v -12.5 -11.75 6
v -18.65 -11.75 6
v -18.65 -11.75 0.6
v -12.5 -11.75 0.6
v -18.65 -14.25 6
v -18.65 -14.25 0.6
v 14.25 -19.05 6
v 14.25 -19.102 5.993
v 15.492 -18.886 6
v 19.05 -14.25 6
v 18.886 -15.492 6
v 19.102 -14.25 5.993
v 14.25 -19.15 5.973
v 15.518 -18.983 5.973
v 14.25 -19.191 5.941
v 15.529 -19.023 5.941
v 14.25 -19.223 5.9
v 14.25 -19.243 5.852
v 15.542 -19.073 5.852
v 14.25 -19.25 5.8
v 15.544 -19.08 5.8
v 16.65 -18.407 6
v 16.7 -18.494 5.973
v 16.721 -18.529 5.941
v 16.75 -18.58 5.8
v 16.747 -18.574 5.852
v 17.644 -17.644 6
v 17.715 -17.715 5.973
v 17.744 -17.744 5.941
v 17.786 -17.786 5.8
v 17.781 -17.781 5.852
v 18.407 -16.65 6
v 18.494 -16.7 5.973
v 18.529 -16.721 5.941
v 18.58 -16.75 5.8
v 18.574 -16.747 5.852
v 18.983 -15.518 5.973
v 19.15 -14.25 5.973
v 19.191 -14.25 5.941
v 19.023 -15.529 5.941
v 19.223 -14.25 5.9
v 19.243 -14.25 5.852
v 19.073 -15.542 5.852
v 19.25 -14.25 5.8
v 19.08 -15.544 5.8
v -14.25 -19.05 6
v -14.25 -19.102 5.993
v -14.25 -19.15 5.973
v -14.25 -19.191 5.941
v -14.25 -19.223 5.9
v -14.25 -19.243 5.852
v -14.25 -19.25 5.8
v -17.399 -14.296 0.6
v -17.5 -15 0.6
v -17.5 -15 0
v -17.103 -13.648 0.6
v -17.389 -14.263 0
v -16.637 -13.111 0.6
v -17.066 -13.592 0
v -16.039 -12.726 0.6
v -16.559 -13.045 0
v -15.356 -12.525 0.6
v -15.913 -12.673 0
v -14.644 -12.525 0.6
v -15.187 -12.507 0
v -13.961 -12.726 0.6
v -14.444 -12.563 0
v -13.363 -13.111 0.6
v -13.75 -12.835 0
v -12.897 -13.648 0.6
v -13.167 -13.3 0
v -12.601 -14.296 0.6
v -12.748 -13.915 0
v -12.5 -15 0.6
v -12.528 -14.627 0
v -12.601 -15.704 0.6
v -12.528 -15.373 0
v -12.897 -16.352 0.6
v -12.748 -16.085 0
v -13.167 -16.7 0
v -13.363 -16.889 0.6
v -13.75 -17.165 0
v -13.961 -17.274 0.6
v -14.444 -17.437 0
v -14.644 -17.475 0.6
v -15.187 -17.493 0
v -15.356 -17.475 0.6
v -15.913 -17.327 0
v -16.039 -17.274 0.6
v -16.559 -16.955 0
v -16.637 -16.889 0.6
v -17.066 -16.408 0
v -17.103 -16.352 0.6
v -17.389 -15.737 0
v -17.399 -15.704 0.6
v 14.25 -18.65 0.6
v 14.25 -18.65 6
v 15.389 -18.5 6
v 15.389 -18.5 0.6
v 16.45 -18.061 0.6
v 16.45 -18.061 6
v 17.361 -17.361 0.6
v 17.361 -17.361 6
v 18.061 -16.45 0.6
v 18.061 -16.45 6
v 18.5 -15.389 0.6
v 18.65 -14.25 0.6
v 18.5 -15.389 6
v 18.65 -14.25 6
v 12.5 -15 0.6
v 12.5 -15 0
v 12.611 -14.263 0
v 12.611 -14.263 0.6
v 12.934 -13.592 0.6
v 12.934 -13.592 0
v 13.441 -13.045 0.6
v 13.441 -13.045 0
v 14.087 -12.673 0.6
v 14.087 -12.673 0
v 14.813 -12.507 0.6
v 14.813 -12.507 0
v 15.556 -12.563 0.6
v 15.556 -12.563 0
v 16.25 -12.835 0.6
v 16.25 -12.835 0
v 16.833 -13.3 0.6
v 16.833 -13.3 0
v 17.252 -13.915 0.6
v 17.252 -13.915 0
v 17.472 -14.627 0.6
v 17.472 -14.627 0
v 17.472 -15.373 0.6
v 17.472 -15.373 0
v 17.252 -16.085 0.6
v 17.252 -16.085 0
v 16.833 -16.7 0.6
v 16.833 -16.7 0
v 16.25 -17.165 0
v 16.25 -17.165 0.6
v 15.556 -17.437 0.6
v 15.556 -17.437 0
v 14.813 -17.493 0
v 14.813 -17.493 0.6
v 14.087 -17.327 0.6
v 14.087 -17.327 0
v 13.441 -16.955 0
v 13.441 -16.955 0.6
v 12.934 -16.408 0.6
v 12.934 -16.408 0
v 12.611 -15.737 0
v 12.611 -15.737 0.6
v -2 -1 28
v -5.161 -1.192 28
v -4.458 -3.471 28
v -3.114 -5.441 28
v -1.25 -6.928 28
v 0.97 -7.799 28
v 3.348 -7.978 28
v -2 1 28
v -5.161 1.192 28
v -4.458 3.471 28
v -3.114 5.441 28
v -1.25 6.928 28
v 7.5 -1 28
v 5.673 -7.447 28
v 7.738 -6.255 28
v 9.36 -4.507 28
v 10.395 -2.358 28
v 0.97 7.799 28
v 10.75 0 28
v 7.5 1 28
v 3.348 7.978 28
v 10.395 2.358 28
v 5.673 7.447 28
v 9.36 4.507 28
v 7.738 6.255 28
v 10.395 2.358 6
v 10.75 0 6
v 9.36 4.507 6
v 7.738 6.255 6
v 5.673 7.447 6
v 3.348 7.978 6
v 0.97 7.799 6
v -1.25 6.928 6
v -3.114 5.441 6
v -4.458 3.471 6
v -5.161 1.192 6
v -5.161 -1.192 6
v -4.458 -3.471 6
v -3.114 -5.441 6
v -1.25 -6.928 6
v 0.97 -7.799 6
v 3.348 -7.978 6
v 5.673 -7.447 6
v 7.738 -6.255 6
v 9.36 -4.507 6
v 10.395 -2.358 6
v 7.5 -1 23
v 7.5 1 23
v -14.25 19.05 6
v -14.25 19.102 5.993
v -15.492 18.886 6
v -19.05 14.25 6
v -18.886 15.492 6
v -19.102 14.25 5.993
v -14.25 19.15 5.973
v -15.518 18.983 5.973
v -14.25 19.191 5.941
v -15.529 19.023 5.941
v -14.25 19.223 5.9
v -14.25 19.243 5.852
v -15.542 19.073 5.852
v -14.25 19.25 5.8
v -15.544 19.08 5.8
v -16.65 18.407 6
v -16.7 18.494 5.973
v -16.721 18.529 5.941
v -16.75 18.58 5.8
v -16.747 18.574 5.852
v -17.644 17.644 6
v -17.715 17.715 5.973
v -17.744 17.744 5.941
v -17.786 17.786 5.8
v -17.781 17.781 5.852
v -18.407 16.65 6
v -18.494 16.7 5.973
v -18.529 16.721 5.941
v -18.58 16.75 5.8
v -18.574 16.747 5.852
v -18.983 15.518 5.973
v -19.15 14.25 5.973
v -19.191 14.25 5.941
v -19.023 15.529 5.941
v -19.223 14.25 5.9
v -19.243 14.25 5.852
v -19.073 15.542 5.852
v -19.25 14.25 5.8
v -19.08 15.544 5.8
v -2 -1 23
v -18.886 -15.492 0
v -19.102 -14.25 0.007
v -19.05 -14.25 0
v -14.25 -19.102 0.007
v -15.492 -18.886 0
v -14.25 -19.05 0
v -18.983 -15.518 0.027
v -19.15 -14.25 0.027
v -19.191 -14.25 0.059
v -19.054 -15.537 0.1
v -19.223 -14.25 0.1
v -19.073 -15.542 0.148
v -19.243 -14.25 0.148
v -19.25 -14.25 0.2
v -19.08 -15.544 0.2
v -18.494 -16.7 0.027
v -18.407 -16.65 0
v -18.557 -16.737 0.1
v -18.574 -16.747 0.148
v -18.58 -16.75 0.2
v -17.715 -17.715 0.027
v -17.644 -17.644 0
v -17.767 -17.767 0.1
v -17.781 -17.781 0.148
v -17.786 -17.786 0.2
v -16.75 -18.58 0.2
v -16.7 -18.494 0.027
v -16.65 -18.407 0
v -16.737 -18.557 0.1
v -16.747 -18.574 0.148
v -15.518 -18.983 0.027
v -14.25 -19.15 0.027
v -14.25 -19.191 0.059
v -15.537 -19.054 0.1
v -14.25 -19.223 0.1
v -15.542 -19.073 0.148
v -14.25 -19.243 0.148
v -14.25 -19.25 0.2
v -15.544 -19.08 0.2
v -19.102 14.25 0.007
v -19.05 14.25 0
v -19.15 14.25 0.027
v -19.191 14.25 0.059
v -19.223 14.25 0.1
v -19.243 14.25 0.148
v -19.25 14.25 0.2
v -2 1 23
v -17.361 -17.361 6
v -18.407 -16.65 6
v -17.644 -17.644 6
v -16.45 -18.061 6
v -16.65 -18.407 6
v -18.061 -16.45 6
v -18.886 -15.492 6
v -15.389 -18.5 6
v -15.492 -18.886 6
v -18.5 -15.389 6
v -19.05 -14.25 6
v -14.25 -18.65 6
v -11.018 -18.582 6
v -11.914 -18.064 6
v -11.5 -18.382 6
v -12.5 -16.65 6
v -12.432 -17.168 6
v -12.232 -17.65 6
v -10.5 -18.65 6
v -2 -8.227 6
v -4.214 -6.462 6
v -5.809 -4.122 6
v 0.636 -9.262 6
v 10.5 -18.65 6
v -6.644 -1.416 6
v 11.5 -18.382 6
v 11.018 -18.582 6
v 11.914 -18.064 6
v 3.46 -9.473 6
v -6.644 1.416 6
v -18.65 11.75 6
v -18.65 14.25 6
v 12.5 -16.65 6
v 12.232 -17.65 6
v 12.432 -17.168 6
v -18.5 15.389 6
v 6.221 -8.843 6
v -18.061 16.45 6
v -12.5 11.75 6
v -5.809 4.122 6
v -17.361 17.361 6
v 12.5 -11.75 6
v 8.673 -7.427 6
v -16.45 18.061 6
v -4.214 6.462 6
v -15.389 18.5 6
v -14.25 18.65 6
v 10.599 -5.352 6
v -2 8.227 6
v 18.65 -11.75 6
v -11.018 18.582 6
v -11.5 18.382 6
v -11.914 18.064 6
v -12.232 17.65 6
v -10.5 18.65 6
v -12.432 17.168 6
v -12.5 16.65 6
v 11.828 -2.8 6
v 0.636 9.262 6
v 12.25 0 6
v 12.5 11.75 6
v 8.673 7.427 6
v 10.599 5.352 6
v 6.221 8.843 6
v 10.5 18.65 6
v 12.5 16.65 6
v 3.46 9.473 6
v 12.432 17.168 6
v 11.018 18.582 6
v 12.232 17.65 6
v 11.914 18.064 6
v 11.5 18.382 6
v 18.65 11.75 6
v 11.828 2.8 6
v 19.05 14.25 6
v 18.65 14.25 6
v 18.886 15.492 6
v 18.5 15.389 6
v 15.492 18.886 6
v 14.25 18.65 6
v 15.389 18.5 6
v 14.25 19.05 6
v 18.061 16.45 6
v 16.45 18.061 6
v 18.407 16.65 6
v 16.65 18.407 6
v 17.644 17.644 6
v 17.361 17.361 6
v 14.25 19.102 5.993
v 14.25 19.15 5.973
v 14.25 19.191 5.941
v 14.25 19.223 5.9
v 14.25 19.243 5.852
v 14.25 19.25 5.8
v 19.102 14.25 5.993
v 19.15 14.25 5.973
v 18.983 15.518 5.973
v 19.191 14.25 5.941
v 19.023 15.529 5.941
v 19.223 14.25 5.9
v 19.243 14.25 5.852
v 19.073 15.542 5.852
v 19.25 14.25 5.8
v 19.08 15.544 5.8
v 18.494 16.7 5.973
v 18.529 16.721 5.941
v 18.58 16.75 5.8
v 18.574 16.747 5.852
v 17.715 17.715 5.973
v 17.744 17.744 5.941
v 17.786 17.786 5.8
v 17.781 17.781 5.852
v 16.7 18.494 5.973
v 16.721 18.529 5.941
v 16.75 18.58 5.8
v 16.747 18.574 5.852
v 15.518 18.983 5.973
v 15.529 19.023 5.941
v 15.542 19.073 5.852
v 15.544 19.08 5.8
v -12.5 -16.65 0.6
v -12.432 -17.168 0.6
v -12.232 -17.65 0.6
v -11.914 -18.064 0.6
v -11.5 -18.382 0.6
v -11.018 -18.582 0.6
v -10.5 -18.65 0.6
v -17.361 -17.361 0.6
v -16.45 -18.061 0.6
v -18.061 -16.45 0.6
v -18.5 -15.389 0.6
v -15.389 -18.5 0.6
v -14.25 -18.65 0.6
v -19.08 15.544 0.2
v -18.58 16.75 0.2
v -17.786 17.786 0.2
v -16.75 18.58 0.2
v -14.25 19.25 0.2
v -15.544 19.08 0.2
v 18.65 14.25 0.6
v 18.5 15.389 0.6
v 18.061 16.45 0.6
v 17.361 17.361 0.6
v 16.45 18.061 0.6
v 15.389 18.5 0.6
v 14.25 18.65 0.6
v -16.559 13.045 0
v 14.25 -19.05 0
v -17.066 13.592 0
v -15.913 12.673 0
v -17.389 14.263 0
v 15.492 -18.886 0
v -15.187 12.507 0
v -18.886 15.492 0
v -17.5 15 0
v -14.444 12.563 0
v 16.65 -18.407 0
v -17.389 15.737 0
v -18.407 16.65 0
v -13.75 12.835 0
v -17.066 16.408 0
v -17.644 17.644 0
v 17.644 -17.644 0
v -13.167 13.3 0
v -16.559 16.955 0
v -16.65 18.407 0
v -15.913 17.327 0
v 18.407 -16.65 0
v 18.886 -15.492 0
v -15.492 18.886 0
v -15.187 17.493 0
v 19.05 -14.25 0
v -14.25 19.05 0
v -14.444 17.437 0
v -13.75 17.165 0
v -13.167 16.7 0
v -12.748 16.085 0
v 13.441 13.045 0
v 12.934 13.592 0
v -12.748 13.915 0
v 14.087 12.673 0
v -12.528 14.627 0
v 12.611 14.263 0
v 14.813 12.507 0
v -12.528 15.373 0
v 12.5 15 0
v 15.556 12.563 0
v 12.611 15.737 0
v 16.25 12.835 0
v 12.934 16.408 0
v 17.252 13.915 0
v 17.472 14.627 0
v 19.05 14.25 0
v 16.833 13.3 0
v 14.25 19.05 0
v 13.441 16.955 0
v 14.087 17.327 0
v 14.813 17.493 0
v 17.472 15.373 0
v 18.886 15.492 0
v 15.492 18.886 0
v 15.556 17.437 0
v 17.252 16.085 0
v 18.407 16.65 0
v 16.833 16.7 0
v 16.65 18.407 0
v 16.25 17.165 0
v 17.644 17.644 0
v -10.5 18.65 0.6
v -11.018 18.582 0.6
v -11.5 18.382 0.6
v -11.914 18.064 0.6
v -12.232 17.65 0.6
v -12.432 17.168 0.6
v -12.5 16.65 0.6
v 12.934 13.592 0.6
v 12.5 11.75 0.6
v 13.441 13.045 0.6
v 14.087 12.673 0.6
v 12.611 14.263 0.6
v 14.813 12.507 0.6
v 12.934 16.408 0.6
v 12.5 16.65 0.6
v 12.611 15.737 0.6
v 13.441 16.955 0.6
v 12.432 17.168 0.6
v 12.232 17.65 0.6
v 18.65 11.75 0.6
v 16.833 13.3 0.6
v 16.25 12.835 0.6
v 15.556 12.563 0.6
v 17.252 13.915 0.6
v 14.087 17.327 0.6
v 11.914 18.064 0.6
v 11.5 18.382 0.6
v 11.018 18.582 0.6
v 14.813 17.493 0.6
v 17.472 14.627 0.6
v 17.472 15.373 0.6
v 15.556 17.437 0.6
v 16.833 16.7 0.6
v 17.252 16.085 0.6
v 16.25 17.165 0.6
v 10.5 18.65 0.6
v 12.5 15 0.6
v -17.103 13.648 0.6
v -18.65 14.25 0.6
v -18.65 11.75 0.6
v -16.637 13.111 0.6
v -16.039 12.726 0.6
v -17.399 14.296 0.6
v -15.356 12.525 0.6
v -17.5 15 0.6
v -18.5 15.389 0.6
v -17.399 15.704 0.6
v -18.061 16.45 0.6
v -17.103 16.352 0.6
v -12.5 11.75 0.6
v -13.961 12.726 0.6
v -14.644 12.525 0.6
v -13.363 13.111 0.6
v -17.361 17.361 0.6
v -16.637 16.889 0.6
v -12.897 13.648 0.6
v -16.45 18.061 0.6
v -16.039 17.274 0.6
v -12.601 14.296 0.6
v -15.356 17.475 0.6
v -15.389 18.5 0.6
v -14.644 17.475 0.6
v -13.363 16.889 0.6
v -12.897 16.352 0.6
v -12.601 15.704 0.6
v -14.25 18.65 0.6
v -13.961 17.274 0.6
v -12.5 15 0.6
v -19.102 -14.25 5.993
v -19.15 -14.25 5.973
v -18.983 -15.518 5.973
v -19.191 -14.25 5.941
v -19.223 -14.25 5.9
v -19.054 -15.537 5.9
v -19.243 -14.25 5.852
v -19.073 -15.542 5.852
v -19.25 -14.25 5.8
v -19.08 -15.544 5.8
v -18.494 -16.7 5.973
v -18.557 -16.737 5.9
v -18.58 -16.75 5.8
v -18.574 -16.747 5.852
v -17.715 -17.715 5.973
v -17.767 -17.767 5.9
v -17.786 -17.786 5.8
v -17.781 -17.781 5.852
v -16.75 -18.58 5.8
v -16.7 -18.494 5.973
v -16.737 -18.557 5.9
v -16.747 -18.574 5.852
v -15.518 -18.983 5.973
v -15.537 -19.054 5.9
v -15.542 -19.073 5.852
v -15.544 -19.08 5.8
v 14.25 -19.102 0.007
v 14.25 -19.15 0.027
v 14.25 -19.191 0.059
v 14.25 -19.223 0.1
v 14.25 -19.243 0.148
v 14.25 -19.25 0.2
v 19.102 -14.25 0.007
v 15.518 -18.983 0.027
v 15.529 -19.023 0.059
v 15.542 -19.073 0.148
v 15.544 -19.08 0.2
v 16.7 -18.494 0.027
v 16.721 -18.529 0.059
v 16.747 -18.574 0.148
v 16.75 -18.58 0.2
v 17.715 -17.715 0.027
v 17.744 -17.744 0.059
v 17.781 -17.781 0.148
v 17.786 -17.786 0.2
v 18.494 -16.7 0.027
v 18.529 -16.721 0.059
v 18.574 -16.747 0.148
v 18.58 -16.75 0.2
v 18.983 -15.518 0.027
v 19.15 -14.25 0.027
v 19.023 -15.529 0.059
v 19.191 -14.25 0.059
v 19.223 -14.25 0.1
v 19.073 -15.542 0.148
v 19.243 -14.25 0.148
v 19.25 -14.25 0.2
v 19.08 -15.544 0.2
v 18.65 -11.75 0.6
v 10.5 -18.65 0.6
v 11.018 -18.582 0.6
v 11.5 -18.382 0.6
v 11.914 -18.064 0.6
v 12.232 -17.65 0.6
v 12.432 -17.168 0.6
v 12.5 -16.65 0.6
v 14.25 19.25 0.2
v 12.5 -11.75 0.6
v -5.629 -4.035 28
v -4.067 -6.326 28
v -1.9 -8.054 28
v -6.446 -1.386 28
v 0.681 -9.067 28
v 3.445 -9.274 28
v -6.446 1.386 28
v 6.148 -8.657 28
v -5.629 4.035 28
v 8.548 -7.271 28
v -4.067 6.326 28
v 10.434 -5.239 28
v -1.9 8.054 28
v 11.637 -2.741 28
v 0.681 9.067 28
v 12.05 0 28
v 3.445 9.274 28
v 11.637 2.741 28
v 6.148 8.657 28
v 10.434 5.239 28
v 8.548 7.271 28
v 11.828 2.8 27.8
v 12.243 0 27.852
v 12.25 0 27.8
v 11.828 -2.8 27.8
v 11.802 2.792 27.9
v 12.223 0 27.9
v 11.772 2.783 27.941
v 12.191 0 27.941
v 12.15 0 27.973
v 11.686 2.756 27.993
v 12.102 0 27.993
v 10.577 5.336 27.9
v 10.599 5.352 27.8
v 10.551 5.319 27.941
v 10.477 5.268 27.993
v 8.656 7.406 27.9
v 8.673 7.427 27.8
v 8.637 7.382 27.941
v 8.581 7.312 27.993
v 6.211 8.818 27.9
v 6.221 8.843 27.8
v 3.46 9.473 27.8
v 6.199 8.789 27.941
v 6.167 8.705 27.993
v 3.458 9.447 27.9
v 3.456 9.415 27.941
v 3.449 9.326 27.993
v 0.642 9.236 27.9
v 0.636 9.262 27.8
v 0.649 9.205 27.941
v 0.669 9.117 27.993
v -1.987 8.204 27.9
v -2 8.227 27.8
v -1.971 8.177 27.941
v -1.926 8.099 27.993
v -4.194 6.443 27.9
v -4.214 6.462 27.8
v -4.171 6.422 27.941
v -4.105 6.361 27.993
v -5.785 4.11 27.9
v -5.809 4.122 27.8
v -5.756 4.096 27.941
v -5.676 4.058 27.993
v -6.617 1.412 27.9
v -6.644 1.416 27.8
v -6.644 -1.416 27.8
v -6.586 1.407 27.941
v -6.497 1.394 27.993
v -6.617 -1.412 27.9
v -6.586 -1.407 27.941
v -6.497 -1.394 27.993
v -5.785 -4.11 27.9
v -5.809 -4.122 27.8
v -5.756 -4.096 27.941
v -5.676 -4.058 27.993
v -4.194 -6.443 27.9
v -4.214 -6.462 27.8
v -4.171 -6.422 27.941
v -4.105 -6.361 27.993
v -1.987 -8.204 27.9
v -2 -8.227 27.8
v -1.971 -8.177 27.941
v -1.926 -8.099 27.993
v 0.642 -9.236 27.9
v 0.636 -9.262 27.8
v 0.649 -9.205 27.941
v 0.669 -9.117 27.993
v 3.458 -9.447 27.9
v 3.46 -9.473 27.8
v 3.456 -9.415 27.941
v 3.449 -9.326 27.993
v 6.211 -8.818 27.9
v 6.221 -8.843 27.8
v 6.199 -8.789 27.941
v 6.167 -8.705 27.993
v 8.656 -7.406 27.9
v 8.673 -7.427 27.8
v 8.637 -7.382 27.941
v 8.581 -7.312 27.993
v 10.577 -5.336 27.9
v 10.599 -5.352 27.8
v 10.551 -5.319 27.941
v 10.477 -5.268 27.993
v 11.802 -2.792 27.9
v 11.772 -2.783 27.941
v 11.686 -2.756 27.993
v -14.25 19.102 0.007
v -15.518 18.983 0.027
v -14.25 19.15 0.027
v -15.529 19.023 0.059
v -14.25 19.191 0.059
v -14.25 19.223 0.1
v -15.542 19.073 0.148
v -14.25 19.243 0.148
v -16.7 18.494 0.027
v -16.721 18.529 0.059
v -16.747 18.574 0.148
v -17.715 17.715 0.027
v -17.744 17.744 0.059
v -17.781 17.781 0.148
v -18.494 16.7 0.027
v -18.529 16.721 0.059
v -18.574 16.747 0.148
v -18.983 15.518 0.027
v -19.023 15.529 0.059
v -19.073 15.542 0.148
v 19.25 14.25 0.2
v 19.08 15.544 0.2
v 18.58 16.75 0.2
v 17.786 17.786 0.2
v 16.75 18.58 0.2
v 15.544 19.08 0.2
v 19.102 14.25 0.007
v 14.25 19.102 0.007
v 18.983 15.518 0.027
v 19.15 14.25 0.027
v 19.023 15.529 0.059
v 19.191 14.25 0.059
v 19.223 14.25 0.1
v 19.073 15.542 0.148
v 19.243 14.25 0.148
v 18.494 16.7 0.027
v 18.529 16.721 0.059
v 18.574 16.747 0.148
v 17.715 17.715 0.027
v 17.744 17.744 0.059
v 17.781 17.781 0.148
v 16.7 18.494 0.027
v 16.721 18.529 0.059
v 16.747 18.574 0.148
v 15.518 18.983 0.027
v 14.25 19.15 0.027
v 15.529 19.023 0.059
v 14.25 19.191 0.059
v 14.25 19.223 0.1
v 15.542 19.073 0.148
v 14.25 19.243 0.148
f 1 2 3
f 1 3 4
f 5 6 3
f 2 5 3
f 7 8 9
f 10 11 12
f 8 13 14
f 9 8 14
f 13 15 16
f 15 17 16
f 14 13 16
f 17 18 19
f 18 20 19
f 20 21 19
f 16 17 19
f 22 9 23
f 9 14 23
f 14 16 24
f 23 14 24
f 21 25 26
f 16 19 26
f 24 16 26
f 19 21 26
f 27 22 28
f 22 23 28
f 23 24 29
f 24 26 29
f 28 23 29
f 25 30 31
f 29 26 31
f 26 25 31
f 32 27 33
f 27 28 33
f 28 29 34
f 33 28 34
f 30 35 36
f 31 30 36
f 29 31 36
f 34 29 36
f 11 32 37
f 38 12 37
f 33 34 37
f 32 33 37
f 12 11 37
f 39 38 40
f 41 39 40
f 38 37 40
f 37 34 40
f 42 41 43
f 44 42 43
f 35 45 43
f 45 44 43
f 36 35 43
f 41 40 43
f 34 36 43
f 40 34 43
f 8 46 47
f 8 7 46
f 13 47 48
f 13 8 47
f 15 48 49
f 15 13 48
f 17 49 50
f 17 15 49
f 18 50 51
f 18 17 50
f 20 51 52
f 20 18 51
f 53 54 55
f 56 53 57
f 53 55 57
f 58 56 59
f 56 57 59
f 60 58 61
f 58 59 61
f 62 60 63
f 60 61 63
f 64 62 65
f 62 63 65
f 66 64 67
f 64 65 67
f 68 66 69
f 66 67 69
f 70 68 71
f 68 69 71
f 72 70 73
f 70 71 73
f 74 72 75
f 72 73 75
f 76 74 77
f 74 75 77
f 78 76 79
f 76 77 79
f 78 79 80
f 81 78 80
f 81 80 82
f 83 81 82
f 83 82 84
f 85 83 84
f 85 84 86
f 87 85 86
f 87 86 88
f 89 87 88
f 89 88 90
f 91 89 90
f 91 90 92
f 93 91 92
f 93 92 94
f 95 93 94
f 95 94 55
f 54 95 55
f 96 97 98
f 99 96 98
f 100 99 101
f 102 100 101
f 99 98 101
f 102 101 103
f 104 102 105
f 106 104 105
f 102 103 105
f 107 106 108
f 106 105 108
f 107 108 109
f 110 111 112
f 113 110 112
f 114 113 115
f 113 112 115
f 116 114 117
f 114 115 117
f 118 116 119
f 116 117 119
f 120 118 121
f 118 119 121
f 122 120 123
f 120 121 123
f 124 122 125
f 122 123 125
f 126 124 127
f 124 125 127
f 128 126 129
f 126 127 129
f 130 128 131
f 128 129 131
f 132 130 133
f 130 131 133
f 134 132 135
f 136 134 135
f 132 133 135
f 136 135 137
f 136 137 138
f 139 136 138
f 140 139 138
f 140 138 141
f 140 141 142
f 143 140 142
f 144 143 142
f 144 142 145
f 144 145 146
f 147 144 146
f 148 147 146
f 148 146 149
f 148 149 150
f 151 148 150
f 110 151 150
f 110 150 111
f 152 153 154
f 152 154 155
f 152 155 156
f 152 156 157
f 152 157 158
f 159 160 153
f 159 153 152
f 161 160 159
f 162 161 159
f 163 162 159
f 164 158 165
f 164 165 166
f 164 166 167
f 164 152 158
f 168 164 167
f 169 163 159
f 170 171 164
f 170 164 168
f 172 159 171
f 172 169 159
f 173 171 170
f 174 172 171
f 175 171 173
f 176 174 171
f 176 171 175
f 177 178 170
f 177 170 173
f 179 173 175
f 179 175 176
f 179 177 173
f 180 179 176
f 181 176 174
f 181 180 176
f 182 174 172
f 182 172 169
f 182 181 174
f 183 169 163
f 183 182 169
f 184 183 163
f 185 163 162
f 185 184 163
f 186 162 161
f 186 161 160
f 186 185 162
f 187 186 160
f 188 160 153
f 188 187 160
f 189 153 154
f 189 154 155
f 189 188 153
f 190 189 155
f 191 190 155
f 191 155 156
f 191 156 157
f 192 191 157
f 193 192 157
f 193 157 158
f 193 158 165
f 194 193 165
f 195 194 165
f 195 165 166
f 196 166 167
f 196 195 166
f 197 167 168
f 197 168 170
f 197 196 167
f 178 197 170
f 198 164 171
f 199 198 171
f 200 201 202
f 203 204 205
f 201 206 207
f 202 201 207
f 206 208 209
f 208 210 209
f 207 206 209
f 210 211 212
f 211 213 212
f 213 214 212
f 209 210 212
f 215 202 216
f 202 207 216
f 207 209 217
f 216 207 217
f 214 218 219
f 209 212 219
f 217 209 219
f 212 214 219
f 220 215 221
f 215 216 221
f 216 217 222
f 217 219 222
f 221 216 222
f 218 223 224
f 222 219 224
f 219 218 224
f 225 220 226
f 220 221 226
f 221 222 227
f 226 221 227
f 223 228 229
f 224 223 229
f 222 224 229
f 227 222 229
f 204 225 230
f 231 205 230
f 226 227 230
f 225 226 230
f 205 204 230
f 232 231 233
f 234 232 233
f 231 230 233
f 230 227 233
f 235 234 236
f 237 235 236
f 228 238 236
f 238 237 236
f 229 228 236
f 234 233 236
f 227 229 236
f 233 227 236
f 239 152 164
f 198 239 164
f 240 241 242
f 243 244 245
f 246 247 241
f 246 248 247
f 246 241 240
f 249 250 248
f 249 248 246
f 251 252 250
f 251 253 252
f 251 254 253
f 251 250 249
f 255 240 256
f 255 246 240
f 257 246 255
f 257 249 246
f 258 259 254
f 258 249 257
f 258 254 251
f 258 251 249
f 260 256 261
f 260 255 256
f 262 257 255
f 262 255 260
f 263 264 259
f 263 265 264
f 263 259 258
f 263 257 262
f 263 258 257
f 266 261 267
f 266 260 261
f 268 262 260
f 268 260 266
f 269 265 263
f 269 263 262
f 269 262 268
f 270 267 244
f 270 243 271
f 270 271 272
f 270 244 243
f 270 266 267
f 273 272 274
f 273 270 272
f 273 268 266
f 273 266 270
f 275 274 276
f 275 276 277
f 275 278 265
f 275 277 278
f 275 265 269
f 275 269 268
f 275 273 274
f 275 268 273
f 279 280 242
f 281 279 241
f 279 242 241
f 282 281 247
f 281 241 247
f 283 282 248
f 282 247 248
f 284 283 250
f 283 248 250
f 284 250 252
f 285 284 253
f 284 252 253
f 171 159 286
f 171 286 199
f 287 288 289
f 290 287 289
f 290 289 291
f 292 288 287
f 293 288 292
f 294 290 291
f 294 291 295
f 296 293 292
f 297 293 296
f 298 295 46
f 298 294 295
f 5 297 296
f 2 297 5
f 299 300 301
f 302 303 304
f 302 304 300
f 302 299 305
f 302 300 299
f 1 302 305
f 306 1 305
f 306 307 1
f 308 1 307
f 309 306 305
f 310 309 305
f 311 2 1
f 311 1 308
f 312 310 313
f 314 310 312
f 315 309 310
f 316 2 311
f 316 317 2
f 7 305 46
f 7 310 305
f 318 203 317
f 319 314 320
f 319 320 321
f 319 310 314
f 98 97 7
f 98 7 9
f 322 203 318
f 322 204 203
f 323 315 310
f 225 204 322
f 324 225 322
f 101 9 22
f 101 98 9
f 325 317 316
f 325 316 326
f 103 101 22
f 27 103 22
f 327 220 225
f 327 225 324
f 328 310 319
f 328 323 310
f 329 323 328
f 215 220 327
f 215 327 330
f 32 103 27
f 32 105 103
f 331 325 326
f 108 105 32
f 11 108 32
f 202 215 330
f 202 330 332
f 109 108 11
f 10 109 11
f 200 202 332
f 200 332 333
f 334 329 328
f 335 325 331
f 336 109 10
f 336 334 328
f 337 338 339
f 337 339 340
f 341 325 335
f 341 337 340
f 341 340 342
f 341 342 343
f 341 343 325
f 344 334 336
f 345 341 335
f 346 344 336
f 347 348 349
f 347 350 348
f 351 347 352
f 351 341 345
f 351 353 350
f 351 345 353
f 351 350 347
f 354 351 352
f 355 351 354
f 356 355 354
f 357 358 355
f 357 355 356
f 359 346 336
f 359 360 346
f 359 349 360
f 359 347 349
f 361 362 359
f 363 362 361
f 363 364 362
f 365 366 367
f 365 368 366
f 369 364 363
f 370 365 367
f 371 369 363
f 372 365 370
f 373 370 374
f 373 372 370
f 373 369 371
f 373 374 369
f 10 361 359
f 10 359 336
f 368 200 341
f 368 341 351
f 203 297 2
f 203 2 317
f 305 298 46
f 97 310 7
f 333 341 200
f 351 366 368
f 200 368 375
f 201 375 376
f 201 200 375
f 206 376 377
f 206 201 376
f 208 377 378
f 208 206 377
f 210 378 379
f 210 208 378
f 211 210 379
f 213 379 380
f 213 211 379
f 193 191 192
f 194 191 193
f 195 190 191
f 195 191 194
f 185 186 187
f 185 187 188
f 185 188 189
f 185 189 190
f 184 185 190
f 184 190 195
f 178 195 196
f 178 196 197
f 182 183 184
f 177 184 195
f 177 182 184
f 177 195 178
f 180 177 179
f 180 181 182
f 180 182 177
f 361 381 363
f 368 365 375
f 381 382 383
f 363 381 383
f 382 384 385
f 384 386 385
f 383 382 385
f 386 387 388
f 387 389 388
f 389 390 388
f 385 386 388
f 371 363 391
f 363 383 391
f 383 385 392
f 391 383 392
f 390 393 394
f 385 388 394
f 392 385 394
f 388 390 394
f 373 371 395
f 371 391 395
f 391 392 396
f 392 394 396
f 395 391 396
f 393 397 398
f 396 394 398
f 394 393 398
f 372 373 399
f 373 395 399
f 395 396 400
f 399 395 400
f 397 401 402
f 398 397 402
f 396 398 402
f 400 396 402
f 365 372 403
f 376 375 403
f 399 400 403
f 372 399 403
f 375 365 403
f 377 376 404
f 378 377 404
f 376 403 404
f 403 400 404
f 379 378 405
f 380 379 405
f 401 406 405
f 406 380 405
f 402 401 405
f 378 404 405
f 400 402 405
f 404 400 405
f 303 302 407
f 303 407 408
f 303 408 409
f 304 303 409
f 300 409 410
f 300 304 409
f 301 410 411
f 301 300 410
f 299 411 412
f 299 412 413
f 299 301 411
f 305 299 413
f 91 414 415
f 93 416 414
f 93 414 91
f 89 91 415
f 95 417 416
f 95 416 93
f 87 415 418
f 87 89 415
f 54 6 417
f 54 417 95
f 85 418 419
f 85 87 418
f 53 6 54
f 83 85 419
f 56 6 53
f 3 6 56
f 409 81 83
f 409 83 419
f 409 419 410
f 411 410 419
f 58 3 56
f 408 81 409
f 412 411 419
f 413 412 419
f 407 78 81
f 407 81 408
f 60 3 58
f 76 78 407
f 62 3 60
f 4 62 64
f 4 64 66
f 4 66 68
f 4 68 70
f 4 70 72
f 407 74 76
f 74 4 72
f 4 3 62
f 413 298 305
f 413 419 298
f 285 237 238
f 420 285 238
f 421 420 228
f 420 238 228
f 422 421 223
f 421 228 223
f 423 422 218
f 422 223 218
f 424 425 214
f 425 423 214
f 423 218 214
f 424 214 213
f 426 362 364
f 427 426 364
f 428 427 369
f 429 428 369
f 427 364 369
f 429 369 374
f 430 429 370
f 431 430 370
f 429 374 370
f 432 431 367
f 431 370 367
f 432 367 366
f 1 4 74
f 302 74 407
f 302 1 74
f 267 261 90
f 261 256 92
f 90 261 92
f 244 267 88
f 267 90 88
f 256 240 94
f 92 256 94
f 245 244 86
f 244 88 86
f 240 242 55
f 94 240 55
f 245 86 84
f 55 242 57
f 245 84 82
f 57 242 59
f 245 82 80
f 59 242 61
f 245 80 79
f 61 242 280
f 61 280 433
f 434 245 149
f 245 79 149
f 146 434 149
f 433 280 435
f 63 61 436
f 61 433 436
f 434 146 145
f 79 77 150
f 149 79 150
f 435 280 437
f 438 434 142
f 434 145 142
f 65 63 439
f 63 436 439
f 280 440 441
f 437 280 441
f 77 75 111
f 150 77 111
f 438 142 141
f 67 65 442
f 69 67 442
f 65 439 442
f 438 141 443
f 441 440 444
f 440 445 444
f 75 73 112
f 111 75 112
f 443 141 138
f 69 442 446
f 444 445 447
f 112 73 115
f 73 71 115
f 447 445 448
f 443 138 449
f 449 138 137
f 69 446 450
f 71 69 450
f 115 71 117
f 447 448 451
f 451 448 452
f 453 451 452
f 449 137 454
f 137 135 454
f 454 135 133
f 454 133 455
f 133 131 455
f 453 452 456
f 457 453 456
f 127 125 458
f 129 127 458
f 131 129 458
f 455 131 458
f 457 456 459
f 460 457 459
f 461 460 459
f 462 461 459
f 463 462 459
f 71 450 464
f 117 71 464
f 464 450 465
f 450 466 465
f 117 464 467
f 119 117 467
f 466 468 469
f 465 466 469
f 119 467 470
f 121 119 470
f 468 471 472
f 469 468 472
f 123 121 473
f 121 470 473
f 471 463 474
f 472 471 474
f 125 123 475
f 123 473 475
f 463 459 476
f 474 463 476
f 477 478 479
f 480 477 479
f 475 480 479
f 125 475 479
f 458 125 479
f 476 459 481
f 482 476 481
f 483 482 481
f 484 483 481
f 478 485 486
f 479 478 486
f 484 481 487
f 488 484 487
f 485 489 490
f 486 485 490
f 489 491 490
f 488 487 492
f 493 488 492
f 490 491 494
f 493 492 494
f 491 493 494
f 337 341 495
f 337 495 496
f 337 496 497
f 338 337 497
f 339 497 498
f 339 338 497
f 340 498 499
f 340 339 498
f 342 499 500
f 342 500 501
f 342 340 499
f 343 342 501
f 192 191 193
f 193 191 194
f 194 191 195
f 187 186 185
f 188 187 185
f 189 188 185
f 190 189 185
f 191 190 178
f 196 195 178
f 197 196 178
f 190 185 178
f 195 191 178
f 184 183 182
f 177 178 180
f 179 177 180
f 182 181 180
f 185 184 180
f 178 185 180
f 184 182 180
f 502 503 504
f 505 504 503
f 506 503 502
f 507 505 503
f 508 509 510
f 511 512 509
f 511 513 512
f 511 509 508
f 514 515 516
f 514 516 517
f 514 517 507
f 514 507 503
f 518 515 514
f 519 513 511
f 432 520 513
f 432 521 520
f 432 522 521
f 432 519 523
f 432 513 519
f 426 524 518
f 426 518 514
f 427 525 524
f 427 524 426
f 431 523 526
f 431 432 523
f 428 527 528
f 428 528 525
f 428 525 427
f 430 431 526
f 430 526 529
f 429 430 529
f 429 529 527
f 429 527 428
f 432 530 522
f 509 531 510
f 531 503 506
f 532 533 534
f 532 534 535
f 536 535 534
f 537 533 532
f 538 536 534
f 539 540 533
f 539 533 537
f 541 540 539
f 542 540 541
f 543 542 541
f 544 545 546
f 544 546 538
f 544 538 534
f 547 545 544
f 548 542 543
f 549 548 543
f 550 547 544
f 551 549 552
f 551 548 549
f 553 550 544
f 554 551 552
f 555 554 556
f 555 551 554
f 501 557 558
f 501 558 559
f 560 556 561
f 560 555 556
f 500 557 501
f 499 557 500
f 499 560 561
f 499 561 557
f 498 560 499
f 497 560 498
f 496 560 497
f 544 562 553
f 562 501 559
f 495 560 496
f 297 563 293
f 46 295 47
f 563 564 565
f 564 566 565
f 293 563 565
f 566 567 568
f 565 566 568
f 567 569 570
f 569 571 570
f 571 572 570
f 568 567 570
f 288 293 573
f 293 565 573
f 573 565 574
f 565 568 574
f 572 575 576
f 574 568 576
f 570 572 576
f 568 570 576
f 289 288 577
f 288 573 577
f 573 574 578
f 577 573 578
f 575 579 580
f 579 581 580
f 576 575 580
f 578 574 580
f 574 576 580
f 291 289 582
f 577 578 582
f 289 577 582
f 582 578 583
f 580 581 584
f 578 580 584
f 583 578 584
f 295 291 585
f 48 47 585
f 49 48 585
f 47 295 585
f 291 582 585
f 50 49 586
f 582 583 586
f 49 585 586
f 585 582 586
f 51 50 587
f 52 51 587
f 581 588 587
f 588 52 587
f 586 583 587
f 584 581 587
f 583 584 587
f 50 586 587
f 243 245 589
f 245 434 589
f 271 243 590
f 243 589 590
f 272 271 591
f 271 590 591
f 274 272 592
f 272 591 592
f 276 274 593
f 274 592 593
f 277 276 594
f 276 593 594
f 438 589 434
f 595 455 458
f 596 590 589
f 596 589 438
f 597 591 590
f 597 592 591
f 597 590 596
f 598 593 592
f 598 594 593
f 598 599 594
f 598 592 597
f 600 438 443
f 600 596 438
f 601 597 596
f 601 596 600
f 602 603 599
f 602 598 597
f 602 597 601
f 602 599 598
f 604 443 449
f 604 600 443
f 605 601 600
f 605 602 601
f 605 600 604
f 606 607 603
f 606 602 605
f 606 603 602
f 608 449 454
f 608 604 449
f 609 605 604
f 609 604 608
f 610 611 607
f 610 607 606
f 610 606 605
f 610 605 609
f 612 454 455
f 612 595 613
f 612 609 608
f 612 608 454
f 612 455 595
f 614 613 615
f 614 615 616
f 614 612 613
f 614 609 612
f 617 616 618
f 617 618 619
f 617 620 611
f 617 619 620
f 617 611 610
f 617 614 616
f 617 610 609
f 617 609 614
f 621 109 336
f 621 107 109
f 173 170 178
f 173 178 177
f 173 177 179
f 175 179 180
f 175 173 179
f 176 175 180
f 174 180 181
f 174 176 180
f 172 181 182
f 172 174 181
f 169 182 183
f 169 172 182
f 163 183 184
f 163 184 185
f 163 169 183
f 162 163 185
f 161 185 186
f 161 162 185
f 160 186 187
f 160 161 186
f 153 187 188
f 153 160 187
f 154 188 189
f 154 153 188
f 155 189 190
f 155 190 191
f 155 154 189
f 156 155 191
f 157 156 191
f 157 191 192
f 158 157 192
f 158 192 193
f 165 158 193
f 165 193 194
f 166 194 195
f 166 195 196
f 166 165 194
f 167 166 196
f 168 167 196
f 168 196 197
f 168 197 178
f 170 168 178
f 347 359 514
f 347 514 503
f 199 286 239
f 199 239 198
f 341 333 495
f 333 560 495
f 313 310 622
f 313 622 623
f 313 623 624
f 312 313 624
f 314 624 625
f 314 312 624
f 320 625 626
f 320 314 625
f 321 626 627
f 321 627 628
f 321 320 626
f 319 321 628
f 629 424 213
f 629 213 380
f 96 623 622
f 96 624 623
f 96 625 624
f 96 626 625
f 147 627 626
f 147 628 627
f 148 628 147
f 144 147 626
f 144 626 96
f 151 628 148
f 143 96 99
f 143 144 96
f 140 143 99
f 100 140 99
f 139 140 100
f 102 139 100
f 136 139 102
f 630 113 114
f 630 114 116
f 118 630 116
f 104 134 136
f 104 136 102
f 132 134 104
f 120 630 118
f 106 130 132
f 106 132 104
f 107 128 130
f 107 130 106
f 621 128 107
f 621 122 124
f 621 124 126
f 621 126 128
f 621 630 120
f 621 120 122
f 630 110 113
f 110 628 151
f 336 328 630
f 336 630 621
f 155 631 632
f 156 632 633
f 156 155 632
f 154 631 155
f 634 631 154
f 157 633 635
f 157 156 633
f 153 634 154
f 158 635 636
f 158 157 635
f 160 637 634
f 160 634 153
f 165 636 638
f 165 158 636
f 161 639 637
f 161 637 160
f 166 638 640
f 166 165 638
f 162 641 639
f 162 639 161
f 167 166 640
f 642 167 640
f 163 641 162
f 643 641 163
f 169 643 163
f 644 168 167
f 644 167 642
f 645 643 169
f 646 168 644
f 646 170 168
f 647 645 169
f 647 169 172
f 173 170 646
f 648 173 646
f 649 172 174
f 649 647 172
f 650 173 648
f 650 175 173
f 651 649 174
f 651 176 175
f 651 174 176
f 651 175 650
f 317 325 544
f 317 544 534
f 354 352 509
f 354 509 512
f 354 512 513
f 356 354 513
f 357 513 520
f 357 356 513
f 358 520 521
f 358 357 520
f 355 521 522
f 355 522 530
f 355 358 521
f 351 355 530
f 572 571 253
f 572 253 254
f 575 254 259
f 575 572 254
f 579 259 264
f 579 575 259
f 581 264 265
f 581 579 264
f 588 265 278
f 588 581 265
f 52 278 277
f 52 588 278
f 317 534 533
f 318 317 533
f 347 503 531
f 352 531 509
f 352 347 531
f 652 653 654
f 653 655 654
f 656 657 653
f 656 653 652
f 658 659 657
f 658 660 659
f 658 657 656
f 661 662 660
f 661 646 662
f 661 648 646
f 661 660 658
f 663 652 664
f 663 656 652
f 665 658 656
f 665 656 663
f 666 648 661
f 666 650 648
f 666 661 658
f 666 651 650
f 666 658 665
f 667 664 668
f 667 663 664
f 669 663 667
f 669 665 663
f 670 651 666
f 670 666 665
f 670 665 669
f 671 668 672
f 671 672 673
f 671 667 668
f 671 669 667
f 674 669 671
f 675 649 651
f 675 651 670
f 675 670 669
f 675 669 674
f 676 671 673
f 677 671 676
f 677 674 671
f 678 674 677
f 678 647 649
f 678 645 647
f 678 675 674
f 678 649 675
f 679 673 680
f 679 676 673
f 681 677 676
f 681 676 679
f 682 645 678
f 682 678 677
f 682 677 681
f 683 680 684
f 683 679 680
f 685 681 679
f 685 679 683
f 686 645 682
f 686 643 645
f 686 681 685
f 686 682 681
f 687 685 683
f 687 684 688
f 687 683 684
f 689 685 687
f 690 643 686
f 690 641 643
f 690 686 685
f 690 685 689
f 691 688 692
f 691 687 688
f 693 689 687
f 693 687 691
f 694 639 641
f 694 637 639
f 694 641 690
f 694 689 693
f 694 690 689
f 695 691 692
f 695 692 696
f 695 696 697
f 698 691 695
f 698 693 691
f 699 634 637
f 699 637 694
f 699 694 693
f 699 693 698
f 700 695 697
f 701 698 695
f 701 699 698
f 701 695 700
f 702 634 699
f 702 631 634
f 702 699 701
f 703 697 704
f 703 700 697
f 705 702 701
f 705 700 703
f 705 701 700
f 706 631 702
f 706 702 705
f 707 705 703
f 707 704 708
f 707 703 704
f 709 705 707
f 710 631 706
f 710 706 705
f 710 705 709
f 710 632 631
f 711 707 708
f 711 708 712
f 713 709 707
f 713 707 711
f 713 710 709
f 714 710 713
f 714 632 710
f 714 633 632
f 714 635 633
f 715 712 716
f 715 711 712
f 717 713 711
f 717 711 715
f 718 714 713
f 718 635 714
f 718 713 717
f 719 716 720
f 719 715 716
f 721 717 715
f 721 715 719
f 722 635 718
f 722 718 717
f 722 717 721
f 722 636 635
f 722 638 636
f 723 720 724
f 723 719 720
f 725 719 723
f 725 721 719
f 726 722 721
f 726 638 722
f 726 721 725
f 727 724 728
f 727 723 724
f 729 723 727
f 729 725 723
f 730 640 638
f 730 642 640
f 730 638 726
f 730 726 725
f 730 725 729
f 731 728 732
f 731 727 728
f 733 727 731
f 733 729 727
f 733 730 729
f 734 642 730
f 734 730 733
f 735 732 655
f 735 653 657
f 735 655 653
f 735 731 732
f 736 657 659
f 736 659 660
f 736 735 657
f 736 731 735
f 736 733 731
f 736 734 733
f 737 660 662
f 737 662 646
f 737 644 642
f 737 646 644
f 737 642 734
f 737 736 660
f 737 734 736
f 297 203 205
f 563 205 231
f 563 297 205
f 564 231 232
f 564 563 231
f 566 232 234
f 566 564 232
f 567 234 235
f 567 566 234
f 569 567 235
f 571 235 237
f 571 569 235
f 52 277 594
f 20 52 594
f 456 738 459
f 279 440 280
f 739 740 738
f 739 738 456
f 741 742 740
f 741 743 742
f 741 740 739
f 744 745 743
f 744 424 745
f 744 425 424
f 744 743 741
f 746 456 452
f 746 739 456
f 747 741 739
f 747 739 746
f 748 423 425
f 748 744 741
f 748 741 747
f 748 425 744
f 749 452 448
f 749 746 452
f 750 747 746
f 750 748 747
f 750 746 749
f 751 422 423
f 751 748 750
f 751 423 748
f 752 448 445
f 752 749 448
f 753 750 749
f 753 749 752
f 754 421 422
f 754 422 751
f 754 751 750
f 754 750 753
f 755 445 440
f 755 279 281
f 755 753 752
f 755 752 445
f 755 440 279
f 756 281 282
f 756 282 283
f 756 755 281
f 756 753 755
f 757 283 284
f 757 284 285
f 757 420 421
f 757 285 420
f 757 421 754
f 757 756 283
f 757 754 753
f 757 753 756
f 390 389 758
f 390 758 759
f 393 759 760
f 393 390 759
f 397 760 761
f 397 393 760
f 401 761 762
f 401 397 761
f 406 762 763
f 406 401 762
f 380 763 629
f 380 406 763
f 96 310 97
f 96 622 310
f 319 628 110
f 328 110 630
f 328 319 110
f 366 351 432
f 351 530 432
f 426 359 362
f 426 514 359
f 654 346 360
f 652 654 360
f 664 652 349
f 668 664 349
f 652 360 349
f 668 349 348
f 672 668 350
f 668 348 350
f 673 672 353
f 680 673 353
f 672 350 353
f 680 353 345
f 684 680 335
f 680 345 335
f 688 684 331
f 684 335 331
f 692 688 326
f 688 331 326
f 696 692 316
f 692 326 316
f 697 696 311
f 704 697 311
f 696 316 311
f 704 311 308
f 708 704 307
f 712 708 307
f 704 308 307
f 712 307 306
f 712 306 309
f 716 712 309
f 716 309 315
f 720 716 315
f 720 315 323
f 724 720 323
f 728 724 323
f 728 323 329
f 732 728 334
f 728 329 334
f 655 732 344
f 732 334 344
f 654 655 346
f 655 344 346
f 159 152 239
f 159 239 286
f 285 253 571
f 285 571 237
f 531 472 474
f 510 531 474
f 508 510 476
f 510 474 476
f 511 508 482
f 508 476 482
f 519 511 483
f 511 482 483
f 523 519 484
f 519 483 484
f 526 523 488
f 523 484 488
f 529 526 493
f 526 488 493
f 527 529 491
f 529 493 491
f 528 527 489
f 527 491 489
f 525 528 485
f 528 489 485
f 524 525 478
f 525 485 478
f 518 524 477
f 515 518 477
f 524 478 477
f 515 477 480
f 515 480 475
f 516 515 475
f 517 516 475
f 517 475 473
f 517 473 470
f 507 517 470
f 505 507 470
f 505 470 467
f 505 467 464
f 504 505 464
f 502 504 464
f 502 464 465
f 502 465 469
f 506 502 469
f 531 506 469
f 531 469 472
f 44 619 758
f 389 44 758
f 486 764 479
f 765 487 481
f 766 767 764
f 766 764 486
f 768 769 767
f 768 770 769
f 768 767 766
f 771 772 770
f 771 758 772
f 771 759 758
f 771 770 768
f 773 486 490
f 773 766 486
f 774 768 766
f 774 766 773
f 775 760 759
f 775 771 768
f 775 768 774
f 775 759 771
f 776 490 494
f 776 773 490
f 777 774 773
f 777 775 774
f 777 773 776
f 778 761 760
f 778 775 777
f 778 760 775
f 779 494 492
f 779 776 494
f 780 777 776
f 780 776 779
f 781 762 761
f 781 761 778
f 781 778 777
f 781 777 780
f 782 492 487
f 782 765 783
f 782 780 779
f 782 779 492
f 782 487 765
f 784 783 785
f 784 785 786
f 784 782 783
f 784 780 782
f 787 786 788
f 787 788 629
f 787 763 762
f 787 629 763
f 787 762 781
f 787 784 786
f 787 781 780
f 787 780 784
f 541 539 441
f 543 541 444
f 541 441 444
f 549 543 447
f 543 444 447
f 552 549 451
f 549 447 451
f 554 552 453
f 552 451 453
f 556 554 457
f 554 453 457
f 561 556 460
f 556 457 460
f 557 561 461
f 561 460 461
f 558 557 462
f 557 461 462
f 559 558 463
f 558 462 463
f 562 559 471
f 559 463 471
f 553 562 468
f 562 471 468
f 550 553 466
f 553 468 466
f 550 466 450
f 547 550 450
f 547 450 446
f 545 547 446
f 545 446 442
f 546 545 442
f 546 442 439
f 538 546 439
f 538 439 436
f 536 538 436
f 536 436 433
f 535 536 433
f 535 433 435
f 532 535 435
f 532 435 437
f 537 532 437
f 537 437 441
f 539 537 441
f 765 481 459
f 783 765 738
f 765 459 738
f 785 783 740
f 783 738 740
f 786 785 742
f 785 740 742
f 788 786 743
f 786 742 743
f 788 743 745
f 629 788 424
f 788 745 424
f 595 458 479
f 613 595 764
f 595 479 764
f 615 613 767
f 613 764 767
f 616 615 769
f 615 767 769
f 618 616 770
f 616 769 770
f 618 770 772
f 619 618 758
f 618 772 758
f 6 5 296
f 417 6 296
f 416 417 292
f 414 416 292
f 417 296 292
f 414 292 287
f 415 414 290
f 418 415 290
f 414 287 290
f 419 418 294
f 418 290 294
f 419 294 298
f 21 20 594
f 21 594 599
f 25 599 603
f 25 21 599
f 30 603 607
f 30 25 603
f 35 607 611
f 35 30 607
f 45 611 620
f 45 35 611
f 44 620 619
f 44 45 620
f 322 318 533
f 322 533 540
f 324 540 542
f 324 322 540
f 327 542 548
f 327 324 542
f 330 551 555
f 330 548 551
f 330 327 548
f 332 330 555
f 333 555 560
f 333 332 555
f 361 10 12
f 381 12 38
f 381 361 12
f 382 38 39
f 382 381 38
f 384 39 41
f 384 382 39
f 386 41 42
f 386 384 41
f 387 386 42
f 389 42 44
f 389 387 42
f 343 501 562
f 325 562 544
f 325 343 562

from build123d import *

# Parameters (mm, degrees)
SKETCH_1_W          = 38.5
SKETCH_1_H          = 38.5
EXTRUDE_1_DEPTH     = 6
FILLET_1_R          = 5
SHELL_1_T           = -0.6
EXTRUDE_2_DEPTH     = 5.4
SKETCH_3_R          = 9.5
SKETCH_3_R_2        = 8
EXTRUDE_1_2_DEPTH   = 22
SKETCH_4_R          = 8
EXTRUDE_3_DEPTH     = 22
SKETCH_5_W          = 9.5
SKETCH_5_H          = 2
CUT_EXTRUDE_1_DEPTH = 5
FILLET_2_R          = 0.2
SKETCH_6_R          = 2.5
CUT_EXTRUDE_2_DEPTH = 10


with BuildPart() as part:
    # 草图1 → Extrude 1 (new body)
    with BuildSketch(Plane.XY):
        Rectangle(SKETCH_1_W, SKETCH_1_H)
    extrude(amount=EXTRUDE_1_DEPTH)

    # 圆角1
    fillet_1_edges = [part.edges().sort_by_distance(p)[0] for p in [
        (-19.25, 19.25, 3),
        (19.25, 19.25, 3),
        (19.25, -19.25, 3),
        (-19.25, -19.25, 3),
    ]]
    fillet(fillet_1_edges, radius=FILLET_1_R)

    # 抽壳1
    shell_1_openings = [part.faces().sort_by_distance(p)[0] for p in [
        (0, 0, 6),
    ]]
    offset(amount=SHELL_1_T, openings=shell_1_openings, kind=Kind.INTERSECTION)



with BuildPart() as body_2:
    # 草图2 → 凸台-拉伸2 (new body)
    with BuildSketch(Plane.XY.offset(6)):
        with BuildLine():
            Line((-12.5, 16.65), (-12.5, 11.75))
            Line((-12.5, 11.75), (-18.65, 11.75))
            Line((-18.65, 11.75), (-18.65, -11.75))
            Line((-18.65, -11.75), (-12.5, -11.75))
            Line((-12.5, -11.75), (-12.5, -16.65))
            ThreePointArc((-12.5, -16.65), (-11.914213562, -18.064213562), (-10.5, -18.65))
            Line((-10.5, -18.65), (10.5, -18.65))
            ThreePointArc((10.5, -18.65), (11.914213562, -18.064213562), (12.5, -16.65))
            Line((12.5, -16.65), (12.5, -11.75))
            Line((12.5, -11.75), (18.65, -11.75))
            Line((18.65, -11.75), (18.65, 11.75))
            Line((18.65, 11.75), (12.5, 11.75))
            Line((12.5, 11.75), (12.5, 16.65))
            ThreePointArc((12.5, 16.65), (11.914213562, 18.064213562), (10.5, 18.65))
            Line((10.5, 18.65), (-10.5, 18.65))
            ThreePointArc((-10.5, 18.65), (-11.914213562, 18.064213562), (-12.5, 16.65))
        make_face()
    extrude(amount=-EXTRUDE_2_DEPTH)


with BuildPart() as part_1:
    add(part.part)

    add(body_2.part)  # Extrude 1 2 merges body 2
    # 草图3 → Extrude 1 2 (add)
    with BuildSketch(Plane.XY.offset(6)):
        with Locations((2.75, 0)):
            Circle(SKETCH_3_R)
        with Locations((2.75, 0)):
            Circle(SKETCH_3_R_2, mode=Mode.SUBTRACT)
    extrude(amount=EXTRUDE_1_2_DEPTH)

    # 圆角2
    fillet_2_edges = [part_1.edges().sort_by_distance(p)[0] for p in [
        (0, -19.25, 0),
        (0, -19.25, 6),
        (-19.25, 0, 0),
        (0, 19.25, 0),
        (19.25, 0, 0),
        (-17.785533906, 17.785533906, 0),
        (17.785533906, 17.785533906, 0),
        (17.785533906, -17.785533906, 0),
        (-17.785533906, -17.785533906, 0),
        (-19.25, 0, 6),
        (19.25, 0, 6),
        (0, 19.25, 6),
        (-17.785533906, 17.785533906, 6),
        (17.785533906, 17.785533906, 6),
        (17.785533906, -17.785533906, 6),
        (-17.785533906, -17.785533906, 6),
        (-6.75, 0, 28),
    ]]
    fillet(fillet_2_edges, radius=FILLET_2_R)

    # 草图6 → 切除-拉伸2 (cut)
    with BuildSketch(Plane(origin=(0, 0, 0), x_dir=(-1, 0, 0), z_dir=(0, 0, -1))):
        with Locations((-15, 15)):
            Circle(SKETCH_6_R)
        with Locations((15, 15)):
            Circle(SKETCH_6_R)
        with Locations((15, -15)):
            Circle(SKETCH_6_R)
        with Locations((-15, -15)):
            Circle(SKETCH_6_R)
    extrude(amount=-CUT_EXTRUDE_2_DEPTH, mode=Mode.SUBTRACT)


with BuildPart() as body_2_2:
    # 草图4 → 凸台-拉伸3 (new body)
    with BuildSketch(Plane.XY.offset(28)):
        with Locations((2.75, 0)):
            Circle(SKETCH_4_R)
    extrude(amount=-EXTRUDE_3_DEPTH)

    # 草图5 → 切除-拉伸1 (cut)
    with BuildSketch(Plane.XY.offset(28)):
        with Locations((2.75, 0)):
            Rectangle(SKETCH_5_W, SKETCH_5_H)
    extrude(amount=-CUT_EXTRUDE_1_DEPTH, mode=Mode.SUBTRACT)


solid = Compound([part_1.part, body_2_2.part])
